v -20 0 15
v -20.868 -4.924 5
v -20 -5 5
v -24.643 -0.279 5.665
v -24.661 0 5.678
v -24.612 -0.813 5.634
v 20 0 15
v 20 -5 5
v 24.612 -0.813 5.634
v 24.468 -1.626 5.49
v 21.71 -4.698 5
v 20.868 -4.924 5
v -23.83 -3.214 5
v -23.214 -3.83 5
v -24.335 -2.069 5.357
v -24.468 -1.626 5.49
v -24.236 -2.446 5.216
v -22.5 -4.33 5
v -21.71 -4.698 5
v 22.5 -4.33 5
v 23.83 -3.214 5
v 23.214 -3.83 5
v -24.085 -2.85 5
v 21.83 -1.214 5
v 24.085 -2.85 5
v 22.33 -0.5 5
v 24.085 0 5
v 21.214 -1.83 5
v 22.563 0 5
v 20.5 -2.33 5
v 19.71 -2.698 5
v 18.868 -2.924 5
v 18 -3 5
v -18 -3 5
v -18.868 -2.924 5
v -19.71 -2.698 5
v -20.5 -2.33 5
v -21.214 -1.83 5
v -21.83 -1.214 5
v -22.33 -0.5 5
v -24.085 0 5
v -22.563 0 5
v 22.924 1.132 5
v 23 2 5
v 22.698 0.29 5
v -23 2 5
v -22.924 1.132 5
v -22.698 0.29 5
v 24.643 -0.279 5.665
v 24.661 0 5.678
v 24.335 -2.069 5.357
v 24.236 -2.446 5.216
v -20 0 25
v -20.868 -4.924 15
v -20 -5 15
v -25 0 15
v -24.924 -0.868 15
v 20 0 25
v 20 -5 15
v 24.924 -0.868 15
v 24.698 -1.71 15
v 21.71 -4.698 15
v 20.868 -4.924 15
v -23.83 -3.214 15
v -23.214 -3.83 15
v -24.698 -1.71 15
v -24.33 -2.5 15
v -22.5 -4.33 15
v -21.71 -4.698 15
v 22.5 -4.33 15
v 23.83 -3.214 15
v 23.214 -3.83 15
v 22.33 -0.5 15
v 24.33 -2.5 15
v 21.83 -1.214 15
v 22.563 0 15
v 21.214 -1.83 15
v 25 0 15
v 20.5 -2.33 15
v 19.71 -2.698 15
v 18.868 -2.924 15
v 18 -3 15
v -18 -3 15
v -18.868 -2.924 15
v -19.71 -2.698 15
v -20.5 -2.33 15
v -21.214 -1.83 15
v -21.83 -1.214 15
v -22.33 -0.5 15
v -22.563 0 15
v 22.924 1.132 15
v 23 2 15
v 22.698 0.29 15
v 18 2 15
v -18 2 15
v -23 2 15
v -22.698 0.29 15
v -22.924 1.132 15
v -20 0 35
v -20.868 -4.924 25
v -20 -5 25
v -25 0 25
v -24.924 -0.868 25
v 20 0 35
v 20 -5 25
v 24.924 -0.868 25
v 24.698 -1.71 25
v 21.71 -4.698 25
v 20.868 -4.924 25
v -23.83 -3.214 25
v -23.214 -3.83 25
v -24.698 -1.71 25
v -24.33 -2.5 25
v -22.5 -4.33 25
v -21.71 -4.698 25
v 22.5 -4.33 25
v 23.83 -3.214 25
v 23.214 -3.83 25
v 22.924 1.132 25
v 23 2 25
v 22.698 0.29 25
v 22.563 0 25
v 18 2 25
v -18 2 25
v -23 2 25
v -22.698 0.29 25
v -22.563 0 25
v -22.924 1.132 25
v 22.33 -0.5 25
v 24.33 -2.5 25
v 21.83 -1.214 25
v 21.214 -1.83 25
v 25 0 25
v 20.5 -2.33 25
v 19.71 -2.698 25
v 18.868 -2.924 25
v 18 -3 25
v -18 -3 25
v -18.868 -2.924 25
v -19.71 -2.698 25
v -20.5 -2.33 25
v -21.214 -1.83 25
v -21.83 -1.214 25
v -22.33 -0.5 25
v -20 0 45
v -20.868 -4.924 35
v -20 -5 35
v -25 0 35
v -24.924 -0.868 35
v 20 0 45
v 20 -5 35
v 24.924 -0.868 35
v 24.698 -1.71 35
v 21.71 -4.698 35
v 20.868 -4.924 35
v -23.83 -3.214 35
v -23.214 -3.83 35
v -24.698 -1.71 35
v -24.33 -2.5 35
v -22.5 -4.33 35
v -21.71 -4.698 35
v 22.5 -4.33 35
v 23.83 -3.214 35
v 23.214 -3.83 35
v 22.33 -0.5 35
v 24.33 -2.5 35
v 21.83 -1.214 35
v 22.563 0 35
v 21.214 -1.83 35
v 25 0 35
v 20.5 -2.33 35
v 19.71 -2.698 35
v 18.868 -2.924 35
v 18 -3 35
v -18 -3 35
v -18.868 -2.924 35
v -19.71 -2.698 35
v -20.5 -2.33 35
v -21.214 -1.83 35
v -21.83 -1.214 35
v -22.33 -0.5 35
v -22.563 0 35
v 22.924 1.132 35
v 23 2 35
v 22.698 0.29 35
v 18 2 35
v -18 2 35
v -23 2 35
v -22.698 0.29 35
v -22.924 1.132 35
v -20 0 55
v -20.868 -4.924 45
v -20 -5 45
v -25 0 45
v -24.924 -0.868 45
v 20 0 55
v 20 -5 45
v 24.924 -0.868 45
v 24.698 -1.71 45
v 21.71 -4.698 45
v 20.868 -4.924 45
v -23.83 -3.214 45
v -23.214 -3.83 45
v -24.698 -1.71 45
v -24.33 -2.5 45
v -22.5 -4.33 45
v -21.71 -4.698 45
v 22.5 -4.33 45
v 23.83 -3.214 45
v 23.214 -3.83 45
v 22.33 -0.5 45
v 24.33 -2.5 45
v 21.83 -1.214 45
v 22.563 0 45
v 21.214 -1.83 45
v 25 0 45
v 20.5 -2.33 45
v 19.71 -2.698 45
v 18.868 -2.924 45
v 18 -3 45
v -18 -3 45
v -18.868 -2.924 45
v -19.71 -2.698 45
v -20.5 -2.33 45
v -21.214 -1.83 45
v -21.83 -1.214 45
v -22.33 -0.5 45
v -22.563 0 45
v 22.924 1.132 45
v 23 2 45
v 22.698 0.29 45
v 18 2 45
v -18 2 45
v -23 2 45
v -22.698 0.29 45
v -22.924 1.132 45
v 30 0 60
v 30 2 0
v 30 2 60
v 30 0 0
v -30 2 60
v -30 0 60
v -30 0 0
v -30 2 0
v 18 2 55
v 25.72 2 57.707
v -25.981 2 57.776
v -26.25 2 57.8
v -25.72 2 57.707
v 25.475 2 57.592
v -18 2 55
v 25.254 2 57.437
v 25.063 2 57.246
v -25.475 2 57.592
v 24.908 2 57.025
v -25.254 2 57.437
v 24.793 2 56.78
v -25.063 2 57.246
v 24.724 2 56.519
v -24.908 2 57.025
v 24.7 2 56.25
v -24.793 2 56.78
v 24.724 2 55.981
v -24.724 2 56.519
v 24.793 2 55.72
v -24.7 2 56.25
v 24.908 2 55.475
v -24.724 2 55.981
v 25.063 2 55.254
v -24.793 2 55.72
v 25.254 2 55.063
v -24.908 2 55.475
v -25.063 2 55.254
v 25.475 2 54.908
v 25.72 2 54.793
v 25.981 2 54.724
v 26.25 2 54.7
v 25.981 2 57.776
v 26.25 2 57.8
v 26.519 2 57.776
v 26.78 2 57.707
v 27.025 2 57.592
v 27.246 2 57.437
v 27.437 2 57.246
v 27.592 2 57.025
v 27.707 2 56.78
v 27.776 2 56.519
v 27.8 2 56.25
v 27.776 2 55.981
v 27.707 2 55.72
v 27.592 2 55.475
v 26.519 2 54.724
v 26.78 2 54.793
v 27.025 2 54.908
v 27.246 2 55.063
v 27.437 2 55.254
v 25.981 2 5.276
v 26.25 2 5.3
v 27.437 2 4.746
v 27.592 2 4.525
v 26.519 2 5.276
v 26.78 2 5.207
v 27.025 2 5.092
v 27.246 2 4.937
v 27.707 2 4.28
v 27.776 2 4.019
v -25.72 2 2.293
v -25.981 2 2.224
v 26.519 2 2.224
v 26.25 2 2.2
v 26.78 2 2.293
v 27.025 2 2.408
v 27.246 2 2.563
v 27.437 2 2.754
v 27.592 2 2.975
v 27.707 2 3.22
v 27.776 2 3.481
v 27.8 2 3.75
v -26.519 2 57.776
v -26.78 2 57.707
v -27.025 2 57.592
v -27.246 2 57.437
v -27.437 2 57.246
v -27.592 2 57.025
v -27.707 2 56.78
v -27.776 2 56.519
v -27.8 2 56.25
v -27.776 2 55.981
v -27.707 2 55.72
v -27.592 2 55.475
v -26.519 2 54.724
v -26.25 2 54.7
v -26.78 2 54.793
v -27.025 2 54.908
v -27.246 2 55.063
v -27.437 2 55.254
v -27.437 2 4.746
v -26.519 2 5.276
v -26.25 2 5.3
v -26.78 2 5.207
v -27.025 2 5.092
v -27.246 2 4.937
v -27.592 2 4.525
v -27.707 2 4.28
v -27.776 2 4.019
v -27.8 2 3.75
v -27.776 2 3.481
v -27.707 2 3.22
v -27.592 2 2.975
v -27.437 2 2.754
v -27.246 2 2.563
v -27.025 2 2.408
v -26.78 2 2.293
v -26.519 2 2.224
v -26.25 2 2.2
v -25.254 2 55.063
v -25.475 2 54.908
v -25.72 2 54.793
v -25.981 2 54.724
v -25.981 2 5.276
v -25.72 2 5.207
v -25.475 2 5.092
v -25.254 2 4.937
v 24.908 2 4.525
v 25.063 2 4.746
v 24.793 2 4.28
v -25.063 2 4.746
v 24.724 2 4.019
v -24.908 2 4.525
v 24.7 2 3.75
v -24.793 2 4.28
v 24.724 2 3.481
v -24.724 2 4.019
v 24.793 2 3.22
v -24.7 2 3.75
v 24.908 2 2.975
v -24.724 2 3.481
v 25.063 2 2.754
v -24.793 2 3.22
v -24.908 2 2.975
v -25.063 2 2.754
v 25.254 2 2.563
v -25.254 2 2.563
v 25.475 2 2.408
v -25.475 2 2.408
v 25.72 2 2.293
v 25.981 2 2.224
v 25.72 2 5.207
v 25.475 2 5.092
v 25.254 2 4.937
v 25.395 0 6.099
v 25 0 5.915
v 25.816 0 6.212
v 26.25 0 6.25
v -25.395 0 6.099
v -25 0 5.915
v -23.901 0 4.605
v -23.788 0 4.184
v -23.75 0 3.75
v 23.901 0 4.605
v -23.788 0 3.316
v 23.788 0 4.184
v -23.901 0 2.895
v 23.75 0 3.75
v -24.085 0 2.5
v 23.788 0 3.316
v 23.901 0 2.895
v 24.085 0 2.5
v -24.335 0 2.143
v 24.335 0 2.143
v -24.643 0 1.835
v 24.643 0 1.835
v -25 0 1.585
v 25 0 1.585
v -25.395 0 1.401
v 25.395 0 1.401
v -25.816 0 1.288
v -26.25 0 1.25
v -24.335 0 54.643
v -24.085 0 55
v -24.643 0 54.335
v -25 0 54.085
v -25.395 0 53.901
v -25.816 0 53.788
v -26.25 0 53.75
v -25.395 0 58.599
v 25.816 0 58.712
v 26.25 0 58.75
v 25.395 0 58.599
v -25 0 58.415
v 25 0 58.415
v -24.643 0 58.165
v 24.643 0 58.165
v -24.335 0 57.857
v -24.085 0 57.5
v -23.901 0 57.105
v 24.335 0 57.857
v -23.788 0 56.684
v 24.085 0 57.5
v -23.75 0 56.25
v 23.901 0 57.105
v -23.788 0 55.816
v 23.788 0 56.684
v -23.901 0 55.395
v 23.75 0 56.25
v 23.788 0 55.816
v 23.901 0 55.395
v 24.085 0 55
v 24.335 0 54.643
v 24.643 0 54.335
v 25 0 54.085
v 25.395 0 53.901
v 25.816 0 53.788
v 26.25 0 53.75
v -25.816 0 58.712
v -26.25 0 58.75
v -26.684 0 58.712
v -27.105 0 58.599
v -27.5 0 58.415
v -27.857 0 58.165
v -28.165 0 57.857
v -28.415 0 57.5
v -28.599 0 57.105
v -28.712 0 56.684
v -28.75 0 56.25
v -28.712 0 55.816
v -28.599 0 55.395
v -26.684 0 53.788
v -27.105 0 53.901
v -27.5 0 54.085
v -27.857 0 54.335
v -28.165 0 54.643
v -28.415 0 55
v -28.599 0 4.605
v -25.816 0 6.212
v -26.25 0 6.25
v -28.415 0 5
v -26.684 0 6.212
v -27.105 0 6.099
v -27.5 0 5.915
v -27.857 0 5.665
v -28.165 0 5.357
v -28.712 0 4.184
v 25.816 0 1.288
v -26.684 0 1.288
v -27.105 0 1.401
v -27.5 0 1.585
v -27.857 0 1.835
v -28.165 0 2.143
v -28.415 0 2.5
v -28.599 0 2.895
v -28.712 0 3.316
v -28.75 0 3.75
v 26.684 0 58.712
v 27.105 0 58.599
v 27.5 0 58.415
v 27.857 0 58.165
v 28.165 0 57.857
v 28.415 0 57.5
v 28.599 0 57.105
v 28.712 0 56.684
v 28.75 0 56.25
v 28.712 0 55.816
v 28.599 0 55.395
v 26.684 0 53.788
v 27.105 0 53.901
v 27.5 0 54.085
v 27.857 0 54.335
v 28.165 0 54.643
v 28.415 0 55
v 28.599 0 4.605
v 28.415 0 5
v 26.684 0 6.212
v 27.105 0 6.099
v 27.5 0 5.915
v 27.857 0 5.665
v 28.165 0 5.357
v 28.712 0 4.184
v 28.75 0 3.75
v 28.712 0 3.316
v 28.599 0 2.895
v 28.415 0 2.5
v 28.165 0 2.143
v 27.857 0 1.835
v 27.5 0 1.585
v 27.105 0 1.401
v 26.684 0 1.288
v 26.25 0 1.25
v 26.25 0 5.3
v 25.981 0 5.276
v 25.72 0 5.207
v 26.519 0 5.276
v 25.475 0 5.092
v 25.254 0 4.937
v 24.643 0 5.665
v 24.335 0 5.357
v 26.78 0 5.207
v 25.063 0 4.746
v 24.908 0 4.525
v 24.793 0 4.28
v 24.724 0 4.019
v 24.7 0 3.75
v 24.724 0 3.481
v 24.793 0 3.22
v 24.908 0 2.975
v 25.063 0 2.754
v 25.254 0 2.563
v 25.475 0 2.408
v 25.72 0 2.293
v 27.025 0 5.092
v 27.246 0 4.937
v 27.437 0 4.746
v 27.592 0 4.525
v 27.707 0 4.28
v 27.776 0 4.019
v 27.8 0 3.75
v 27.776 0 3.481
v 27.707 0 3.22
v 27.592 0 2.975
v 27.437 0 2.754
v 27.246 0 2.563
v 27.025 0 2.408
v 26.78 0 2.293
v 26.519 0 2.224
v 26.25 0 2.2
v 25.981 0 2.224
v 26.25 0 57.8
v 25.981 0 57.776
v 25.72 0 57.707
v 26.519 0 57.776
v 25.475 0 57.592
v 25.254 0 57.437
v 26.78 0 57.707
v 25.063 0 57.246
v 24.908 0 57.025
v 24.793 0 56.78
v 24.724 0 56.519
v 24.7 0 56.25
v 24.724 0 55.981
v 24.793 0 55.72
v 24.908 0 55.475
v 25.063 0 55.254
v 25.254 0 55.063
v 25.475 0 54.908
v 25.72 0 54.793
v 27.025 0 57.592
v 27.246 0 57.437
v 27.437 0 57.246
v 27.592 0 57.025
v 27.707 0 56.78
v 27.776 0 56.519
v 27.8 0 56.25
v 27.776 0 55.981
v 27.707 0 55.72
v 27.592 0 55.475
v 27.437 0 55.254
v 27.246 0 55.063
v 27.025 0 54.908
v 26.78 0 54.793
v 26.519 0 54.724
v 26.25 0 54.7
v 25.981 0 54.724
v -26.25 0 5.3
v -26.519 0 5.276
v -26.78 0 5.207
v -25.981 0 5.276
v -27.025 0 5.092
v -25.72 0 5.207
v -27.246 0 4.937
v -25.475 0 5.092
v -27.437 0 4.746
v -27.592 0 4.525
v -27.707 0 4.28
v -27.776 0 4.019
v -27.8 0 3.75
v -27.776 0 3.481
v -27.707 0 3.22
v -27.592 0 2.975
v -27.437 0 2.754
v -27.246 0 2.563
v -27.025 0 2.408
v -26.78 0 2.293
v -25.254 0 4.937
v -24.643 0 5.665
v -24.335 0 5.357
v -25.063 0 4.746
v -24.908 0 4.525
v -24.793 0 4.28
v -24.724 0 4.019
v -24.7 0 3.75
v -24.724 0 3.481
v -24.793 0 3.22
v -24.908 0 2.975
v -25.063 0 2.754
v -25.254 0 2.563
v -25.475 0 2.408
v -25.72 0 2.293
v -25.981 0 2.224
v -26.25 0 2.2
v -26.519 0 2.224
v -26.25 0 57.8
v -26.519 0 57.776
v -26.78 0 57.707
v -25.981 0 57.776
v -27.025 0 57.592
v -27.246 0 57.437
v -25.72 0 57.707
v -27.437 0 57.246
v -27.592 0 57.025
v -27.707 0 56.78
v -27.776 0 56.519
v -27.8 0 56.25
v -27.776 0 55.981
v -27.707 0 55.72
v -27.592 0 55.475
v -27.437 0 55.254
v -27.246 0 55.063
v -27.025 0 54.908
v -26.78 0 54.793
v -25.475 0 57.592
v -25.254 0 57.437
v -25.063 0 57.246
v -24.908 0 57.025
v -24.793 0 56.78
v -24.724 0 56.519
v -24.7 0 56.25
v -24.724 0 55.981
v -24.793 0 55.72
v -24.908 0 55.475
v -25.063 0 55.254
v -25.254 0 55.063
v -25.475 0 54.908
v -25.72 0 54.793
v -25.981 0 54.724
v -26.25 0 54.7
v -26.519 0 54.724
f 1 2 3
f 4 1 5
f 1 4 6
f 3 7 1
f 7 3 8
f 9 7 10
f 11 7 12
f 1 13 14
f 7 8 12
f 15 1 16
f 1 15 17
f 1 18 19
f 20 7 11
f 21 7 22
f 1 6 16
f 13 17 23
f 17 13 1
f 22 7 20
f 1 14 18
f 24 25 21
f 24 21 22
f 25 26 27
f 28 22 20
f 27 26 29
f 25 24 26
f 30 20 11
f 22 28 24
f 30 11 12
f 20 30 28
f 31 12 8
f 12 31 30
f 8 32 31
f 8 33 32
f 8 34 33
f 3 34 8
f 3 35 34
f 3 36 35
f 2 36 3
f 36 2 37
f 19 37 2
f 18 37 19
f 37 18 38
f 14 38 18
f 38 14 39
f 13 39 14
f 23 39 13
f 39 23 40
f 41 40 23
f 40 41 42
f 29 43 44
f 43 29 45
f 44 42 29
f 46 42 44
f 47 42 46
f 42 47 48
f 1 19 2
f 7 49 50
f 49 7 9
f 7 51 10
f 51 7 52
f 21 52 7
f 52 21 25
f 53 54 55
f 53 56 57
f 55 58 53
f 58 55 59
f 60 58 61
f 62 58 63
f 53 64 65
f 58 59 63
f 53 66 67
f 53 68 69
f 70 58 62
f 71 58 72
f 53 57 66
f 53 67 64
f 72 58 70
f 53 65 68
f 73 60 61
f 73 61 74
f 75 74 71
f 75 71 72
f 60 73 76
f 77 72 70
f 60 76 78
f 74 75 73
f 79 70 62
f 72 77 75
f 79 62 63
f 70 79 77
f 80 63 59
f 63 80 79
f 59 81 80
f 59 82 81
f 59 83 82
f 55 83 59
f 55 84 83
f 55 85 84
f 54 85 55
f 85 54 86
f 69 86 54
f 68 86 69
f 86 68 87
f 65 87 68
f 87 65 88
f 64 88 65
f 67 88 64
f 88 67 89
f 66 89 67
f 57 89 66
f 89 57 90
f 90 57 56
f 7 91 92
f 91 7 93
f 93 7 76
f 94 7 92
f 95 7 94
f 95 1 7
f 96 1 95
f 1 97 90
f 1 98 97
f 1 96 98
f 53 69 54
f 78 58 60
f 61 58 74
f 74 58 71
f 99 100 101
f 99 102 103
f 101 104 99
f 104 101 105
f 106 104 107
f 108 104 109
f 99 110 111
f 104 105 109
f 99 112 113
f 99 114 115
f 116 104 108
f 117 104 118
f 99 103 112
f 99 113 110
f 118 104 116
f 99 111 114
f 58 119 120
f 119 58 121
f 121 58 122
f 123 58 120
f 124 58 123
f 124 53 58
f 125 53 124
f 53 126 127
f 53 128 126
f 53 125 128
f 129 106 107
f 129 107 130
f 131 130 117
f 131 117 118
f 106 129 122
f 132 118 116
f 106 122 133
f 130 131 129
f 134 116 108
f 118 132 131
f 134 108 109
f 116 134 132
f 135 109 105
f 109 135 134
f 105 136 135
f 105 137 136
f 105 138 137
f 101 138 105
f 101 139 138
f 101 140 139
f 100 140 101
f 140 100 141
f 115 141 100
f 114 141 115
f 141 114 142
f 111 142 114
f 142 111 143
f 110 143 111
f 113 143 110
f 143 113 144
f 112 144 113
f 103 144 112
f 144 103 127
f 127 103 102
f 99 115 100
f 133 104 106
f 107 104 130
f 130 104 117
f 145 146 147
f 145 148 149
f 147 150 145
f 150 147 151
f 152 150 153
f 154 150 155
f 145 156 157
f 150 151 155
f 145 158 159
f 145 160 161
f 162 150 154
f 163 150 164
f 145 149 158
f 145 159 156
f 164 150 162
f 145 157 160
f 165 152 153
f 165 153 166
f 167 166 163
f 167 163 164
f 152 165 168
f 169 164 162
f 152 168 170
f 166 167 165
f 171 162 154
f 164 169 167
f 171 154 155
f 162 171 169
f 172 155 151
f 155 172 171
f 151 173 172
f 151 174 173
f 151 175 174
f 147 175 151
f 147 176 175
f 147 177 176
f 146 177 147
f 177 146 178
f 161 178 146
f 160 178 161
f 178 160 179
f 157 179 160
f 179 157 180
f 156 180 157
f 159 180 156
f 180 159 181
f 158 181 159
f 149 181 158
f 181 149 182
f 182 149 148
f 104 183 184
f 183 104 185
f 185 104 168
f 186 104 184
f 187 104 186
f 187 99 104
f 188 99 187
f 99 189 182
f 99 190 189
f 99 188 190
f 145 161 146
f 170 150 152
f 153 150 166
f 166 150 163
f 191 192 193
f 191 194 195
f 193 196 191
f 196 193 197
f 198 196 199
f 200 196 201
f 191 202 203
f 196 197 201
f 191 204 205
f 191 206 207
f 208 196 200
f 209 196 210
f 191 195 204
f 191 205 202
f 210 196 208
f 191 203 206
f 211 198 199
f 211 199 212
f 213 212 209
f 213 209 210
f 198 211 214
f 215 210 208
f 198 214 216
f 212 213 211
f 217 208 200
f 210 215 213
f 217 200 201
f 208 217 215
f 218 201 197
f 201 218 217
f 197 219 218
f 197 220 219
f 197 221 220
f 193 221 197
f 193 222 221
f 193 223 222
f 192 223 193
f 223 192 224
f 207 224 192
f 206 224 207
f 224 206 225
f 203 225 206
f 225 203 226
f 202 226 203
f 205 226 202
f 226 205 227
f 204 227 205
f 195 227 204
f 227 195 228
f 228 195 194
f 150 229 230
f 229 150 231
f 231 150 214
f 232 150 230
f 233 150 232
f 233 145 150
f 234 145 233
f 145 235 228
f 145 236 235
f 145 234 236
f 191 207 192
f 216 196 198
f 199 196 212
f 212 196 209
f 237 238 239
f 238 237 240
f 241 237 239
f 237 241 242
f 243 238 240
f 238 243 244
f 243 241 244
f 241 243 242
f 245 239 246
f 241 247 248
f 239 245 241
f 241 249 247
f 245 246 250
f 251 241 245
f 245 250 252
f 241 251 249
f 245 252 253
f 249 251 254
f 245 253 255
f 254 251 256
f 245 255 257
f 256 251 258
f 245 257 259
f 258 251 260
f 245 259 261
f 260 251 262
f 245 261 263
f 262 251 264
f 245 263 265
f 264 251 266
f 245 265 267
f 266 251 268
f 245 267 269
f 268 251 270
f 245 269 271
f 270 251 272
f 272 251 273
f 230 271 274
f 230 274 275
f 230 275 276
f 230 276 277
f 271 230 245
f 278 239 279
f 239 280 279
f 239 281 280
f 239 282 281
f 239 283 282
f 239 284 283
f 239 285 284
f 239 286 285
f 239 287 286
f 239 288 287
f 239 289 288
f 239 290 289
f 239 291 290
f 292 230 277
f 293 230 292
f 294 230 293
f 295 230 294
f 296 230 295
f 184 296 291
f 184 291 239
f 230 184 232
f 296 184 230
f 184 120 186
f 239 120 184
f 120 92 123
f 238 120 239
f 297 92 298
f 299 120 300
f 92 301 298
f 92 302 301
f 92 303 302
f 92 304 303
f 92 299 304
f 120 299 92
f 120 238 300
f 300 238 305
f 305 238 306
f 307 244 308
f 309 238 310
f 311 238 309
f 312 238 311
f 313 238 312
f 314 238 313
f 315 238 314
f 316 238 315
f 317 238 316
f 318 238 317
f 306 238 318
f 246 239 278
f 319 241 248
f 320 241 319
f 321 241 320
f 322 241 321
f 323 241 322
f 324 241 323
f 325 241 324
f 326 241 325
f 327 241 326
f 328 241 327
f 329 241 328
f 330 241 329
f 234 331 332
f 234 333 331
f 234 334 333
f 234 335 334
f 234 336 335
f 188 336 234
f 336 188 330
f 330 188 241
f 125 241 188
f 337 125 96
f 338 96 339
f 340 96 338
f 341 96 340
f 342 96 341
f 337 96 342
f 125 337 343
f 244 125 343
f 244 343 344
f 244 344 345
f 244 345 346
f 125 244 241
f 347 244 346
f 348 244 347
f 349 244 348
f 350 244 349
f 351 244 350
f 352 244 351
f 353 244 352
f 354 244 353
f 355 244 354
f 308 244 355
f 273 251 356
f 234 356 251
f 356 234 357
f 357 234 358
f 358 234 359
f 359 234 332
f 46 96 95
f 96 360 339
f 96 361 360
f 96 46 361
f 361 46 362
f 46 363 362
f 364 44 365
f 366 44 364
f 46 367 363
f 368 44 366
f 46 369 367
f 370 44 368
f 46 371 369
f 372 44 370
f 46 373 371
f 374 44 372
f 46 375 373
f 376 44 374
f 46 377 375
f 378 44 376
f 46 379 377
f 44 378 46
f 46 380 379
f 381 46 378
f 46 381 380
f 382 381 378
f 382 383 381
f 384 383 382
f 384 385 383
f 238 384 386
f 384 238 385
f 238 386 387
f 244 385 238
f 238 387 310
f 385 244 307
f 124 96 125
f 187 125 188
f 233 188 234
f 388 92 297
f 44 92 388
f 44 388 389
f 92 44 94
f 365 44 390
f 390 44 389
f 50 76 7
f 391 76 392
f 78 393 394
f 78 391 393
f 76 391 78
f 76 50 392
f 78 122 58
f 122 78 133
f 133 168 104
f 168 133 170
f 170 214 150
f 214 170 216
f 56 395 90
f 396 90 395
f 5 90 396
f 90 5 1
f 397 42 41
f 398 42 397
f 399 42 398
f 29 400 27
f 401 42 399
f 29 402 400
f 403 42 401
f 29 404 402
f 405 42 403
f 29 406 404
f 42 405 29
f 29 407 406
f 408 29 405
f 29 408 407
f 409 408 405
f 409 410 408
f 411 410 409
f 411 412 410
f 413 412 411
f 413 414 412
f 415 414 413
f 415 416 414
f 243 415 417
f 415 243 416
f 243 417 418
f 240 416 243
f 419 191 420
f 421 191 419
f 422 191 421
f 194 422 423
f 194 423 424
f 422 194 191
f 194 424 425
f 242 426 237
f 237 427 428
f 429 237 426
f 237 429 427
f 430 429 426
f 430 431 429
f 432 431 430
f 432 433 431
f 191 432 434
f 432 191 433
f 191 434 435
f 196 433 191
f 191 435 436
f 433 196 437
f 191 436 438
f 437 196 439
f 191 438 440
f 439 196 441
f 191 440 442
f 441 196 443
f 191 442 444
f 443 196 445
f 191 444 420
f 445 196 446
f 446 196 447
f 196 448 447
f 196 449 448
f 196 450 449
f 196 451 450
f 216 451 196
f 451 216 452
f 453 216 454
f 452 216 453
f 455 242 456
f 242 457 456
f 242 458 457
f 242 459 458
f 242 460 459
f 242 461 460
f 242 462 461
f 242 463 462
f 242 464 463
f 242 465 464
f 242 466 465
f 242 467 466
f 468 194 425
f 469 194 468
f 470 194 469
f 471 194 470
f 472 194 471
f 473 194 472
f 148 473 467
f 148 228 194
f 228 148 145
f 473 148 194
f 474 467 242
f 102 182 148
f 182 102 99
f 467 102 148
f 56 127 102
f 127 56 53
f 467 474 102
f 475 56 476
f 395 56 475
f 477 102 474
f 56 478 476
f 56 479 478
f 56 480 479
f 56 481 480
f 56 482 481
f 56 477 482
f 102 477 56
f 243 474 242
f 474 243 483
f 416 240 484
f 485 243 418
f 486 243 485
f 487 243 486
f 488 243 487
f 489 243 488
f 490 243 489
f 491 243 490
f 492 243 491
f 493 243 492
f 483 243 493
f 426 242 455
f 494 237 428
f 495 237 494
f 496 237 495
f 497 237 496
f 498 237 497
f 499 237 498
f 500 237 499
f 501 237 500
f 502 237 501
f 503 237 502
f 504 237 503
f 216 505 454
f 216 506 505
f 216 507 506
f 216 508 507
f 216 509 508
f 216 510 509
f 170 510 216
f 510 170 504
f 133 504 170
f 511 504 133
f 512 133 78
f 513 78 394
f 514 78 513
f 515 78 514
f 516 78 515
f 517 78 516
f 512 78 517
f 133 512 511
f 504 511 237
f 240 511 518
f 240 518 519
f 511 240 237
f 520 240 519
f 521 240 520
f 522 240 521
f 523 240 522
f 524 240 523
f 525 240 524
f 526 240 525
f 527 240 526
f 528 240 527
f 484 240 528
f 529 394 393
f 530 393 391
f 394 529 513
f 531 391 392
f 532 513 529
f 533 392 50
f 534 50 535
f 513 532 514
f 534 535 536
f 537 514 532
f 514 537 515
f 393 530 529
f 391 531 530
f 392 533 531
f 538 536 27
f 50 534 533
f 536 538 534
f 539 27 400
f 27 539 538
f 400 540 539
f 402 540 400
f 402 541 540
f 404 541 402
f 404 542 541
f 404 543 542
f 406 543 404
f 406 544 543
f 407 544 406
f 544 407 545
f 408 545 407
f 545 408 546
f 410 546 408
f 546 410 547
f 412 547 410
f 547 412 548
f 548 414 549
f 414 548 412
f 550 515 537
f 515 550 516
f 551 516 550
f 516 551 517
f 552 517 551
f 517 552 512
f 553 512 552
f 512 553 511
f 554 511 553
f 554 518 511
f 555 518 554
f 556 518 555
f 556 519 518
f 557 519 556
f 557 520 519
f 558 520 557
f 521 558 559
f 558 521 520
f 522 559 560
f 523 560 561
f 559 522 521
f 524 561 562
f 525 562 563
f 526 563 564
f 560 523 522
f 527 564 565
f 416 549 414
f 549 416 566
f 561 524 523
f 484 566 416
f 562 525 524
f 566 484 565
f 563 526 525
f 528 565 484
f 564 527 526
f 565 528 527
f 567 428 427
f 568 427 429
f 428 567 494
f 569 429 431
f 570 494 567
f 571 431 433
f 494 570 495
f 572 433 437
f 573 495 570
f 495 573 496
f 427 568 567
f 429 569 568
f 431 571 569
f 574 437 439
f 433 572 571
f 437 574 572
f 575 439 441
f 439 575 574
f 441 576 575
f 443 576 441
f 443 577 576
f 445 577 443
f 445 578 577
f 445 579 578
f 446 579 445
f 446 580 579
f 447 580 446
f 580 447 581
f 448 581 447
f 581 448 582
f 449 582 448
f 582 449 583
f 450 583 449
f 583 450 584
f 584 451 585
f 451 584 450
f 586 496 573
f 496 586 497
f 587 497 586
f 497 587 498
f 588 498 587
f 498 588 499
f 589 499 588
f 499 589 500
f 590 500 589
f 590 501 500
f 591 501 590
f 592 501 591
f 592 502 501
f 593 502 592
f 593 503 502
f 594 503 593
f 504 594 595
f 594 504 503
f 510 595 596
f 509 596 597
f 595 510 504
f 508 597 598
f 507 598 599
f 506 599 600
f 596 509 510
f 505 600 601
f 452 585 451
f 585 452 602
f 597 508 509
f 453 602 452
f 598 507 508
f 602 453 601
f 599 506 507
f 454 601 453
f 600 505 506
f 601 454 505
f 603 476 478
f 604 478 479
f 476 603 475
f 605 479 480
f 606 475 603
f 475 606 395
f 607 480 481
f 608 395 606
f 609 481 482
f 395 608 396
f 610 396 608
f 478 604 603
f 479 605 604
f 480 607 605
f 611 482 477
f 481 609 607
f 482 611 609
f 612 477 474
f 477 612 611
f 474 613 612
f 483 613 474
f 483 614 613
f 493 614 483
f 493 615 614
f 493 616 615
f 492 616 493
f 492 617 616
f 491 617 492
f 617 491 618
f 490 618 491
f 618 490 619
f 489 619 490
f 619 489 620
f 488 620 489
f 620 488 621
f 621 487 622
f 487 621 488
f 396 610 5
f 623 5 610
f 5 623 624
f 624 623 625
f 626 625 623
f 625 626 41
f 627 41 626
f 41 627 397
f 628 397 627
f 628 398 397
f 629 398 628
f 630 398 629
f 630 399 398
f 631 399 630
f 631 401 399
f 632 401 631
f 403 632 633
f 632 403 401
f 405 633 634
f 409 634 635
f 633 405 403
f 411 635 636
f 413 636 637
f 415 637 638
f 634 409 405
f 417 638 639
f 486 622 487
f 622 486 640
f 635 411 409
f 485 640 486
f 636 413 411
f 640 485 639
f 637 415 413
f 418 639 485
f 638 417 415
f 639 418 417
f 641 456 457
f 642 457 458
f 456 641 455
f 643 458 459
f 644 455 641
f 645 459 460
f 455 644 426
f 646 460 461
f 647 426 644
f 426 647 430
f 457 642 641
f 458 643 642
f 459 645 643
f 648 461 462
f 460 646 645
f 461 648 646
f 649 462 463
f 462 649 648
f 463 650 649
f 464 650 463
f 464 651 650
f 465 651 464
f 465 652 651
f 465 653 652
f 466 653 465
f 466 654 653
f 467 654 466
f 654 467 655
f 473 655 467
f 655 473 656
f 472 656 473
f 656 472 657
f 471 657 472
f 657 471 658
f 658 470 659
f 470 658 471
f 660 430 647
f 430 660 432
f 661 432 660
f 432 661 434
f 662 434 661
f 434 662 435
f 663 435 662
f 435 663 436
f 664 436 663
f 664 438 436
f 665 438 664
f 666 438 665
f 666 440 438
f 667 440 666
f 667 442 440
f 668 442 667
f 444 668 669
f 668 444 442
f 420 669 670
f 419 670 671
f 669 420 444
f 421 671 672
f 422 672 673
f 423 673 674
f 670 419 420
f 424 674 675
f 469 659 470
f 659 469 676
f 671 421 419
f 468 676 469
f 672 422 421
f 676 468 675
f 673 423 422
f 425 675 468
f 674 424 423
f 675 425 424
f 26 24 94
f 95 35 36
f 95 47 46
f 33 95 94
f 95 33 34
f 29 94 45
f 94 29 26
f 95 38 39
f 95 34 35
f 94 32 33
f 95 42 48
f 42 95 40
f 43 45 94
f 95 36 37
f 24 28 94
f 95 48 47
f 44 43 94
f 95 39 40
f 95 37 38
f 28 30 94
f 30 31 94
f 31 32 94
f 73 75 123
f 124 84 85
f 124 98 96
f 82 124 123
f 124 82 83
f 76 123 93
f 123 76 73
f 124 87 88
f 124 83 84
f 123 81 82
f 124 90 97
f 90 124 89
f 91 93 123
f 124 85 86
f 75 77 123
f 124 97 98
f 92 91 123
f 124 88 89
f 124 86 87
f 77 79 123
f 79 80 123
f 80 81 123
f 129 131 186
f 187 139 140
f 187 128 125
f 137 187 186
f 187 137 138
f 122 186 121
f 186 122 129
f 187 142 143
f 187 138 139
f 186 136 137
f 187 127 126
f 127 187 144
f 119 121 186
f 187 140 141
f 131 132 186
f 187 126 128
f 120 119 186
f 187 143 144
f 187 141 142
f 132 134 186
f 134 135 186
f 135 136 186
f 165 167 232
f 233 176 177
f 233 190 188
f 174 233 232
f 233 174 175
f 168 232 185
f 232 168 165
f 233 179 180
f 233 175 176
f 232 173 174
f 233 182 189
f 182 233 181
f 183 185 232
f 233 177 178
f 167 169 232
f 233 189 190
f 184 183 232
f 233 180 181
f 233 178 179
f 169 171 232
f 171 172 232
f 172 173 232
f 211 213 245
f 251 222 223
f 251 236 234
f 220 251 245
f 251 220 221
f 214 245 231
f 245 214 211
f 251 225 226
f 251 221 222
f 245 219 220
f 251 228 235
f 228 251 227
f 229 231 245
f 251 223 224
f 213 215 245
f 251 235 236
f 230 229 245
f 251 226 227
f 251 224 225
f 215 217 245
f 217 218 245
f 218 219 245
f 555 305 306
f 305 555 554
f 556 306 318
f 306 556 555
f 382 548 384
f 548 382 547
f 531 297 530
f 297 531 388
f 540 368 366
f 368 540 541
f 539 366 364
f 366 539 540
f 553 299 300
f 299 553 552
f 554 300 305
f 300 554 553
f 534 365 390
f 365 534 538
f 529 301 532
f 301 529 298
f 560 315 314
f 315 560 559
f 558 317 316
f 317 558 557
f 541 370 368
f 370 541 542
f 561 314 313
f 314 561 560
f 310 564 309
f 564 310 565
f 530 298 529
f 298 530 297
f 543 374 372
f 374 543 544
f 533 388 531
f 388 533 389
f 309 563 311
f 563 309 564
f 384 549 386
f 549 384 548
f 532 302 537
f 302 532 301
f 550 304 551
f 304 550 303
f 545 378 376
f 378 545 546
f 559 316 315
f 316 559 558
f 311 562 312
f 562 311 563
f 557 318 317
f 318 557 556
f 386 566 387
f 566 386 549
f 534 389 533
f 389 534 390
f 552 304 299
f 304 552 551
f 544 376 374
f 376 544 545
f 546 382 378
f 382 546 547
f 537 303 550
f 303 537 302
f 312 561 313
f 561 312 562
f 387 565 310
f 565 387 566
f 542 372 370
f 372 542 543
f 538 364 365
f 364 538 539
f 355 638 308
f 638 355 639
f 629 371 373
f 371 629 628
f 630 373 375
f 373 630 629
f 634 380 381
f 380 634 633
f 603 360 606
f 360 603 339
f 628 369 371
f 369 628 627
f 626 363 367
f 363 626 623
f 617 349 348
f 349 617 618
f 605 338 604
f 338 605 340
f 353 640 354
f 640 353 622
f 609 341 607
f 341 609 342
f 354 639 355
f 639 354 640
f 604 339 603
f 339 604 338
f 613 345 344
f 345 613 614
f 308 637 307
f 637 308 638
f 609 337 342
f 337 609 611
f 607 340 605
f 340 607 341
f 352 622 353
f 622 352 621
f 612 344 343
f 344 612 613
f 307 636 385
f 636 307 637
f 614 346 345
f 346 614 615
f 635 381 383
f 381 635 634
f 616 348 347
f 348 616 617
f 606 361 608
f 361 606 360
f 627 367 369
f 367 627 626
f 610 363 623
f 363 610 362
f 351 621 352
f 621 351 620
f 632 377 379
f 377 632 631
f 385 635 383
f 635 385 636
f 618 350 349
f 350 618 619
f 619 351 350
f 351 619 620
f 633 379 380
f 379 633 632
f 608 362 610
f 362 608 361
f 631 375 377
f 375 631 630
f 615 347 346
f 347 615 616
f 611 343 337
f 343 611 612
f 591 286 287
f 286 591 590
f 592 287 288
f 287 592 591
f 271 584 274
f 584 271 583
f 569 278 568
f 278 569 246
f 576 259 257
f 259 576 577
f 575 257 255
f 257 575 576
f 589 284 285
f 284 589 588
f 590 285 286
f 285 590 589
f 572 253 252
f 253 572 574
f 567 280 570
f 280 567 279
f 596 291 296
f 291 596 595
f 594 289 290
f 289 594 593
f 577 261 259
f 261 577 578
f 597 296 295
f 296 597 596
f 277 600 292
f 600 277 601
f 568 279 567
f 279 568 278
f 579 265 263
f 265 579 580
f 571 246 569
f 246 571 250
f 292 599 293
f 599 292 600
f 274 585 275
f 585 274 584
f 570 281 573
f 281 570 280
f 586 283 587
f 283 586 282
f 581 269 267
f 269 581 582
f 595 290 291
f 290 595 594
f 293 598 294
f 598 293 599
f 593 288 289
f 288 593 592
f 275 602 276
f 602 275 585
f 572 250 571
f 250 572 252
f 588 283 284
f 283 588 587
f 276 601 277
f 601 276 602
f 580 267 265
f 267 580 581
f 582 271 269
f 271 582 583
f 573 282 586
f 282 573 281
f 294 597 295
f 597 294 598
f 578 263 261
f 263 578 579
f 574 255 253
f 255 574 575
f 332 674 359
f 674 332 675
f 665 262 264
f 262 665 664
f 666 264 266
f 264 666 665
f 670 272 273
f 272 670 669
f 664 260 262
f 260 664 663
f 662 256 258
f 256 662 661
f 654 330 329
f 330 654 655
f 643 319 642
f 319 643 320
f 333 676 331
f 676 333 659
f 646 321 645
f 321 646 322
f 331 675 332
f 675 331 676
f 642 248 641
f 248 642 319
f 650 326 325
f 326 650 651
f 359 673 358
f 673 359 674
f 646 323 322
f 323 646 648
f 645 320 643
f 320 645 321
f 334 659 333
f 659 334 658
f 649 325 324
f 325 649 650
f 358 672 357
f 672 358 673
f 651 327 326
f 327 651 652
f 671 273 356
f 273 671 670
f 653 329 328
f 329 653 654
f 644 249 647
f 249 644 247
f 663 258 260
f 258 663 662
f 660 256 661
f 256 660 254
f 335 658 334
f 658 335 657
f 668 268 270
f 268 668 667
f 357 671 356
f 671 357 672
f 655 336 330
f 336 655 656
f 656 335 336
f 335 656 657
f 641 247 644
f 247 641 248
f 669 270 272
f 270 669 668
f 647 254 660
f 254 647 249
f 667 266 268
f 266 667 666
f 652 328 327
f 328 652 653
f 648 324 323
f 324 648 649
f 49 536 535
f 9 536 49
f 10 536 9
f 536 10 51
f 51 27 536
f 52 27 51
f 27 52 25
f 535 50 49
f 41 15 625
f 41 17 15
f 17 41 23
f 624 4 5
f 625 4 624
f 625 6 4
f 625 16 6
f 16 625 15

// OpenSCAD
// Overall grill width 
width = 60;         // [1:1:200]

// Overall grill height
height = 60;        // [1:1:200]

// General thickness of plate
thickness = 2;      // [1:0.2:10]

// Width of the gap between vertical and each slat at it's base
opening = 5;        // [1:1:50]

// Number of slats
slats = 5;          // [1:1:20]

// Perimeter width (Min recommended >= 2*metric)
flange = 5;         // [1:1:10]

// Screw diameter (0 = no screw)
metric = 2.5;         // [0:0.5:8]

/* [Hidden] */

$fn = 36;
slat_height = (height-2*flange)/slats;

    centers = [ [ (width/2-flange+metric/2),0,flange-metric/2],
                [-(width/2-flange+metric/2),0,flange-metric/2],
                [ (width/2-flange+metric/2),0,height-flange+metric/2],
                [-(width/2-flange+metric/2),0,height-flange+metric/2]];
difference () {
    
    union () {
        translate ([-width/2,0,0]) cube ([width, thickness, height]);   // base cube
        slats_maker();                                                  // outer slats wall
    }
    slats_maker(offset=thickness);                                      // inner slats wall to substract
    translate ([-width/2,thickness,0]) cube ([width, opening*2, height*2]); //Back large cube to substract remainings
    //screw drills
    if ( metric > 0 ) {
        translate ([0,1.5*thickness,0]) for (i=centers) { translate (i) rotate ([90,0,0]) cylinder (r=metric/2+0.3, h=2*thickness);}
        for (i=centers) { translate (i) rotate ([90,0,0]) cylinder (r=metric, h=2*opening);}
    }
}

// makes 2 cones hull several times, one over another
module slats_maker (offset=0) {
    for (i=[0:slats-1]) {
        translate ([0,0,flange+slat_height*i]) {
            hull () {
                translate ([-width/2+opening+flange+offset,offset,0]) cylinder (r1=opening, r2=0, h=slat_height);
                translate ([+width/2-opening-flange-offset,offset,0]) cylinder (r1=opening, r2=0, h=slat_height);
            }          
        }
    } 
}
//makes 4 cylinders in simetric given coordinates
module pillars (px=70, py=40, pr=6, pr2="undef", ph=15) {
    rr2 = (pr2 == "undef") ? pr : pr2 ;
    centers = [[ px, py, 0],[-px, py, 0],[-px,-py, 0],[ px,-py, 0]];
    for (i=centers) { translate (i) cylinder (r1=pr, r2=rr2, h=ph); }
}
/*

VENTILATION GRILL BY DANEBAE (2018-05-03)

This work is licensed under a Creative Commons Attribution-ShareAlike 2.5 License - https://creativecommons.org/licenses/by-sa/2.5

Revision history:

V 1.0
    - Intended to be a ventilation grill for projects that need heat evacuation with outdoor enclosures
    - Glue it to your project wall instead of using screws to make the joint waterproof.

V 1.1 (2018-06-21)
    - Added corner drills for srews

*/
